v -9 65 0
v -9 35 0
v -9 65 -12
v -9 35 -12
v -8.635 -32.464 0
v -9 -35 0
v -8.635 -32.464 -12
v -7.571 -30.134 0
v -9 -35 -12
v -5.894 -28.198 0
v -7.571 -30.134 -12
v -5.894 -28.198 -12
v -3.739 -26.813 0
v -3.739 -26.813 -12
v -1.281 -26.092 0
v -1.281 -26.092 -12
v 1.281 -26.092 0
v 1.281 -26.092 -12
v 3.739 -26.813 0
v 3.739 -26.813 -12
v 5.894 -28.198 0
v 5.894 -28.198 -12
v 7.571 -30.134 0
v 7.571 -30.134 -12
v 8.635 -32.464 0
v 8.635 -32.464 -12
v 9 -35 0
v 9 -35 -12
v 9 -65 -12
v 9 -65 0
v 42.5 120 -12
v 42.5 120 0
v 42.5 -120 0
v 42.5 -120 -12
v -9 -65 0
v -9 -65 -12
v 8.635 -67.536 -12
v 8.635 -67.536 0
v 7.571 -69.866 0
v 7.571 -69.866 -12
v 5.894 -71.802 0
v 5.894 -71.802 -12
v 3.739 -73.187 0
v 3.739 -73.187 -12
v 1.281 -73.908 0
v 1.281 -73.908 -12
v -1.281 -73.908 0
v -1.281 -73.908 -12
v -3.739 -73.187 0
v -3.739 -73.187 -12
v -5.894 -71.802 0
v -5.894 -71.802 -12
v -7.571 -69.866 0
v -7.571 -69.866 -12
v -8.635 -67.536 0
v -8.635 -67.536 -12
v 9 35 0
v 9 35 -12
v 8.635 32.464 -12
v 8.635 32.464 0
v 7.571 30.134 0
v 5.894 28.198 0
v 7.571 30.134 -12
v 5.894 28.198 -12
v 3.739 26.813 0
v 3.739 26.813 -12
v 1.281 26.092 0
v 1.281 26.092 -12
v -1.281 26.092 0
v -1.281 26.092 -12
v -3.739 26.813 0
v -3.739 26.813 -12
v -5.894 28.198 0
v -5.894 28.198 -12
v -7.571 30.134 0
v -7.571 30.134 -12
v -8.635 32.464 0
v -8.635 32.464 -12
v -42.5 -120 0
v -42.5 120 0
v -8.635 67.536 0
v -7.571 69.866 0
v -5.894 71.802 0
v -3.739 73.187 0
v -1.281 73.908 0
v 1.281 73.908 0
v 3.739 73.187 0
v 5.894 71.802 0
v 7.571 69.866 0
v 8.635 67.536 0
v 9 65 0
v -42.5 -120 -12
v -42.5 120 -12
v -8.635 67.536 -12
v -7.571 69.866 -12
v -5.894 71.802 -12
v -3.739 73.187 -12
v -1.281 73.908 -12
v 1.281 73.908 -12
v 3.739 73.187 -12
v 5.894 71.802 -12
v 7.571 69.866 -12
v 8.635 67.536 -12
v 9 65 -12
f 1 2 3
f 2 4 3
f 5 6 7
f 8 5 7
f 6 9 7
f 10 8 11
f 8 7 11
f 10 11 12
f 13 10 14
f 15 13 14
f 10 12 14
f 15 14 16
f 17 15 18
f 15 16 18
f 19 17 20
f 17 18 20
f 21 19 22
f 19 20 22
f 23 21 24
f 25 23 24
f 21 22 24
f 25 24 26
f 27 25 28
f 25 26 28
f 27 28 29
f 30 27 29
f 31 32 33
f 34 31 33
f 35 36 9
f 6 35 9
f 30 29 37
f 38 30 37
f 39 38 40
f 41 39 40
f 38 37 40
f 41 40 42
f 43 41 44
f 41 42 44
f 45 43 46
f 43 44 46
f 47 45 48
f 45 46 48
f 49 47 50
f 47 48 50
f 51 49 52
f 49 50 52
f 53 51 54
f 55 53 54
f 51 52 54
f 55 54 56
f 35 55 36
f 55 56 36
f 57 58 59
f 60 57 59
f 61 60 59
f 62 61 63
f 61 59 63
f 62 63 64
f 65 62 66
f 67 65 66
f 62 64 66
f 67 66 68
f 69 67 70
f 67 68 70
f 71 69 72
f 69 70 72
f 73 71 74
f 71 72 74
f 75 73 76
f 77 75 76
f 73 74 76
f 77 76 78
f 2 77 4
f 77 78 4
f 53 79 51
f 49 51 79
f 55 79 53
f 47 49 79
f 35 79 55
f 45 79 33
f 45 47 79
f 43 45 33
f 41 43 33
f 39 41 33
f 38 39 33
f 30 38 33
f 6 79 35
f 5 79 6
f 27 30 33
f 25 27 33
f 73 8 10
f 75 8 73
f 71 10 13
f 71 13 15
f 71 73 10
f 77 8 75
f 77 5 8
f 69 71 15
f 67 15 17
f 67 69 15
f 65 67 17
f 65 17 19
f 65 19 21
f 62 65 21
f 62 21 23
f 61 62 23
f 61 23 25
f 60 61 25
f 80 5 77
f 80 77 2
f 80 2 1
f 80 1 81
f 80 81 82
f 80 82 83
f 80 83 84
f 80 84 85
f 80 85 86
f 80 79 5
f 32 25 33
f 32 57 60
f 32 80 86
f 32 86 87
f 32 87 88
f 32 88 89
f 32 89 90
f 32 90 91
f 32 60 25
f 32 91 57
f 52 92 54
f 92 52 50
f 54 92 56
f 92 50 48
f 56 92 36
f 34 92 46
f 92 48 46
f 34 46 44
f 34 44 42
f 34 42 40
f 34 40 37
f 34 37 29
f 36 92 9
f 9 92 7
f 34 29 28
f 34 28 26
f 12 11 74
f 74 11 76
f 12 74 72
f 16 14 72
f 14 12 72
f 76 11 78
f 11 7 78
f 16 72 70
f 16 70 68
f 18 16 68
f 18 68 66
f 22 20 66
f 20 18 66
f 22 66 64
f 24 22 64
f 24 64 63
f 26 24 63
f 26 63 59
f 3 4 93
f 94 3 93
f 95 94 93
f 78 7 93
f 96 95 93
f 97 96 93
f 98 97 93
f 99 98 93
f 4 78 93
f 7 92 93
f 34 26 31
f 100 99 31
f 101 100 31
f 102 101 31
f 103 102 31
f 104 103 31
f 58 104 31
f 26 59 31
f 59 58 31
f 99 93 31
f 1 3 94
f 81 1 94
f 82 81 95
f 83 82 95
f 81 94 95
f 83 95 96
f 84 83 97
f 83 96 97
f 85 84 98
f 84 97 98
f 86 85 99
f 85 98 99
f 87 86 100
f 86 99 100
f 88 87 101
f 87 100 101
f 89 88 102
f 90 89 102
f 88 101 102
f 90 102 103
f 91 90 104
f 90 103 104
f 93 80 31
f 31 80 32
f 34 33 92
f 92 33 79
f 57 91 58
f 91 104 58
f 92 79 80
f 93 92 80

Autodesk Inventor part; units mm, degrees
ref_plane "YZ Plane" through (0, 0, 0) normal (1, 0, 0) x (0, 1, 0)
ref_plane "XZ Plane" through (0, 0, 0) normal (0, 1, 0) x (-1, 0, 0)
ref_plane "XY Plane" through (0, 0, 0) normal (0, 0, 1) x (1, 0, 0)
sketch "Sketch1" plane through (0, 0, 0) normal (0, 0, 1) x (1, 0, 0)
  line L0 (42.5, -120) -> (-42.5, -120)
  line L1 (-42.5, -120) -> (-42.5, 120)
  line L2 (-42.5, 120) -> (42.5, 120)
  line L3 (42.5, 120) -> (42.5, -120)
  line L4 (42.5, -120) -> (-42.5, 120) construction
  line L5 (-42.5, -120) -> (42.5, 120) construction
  point P0 (0, 0)
  dimension "d42" = 85
  dimension "d43" = 240
extrude "Extrusion1" add sketch "Sketch1" against normal blind 12
sketch "Sketch2" plane through (0, 0, -12) normal (0, 0, -1) x (1, 0, 0)
  line L0 (42.5, -120) -> (42.5, 120) projected
  line L1 (0, -50) -> (0, 50)
  line L2 (0, -65) -> (0, -35) construction
  line L3 (9, -65) -> (9, -35)
  line L4 (-9, -35) -> (-9, -65)
  arc A0 (-9, -65) -> (9, -65) centre (0, -65) ccw
  arc A1 (9, -35) -> (-9, -35) centre (0, -35) ccw
  line L5 (0, 35) -> (0, 65) construction
  line L6 (9, 35) -> (9, 65)
  line L7 (-9, 65) -> (-9, 35)
  arc A2 (-9, 35) -> (9, 35) centre (0, 35) ccw
  arc A3 (9, 65) -> (-9, 65) centre (0, 65) ccw
  point P0 (0, 0)
  point P1 (0, -50)
  point P2 (0, 0)
  dimension "d46" = 100
  dimension "d47" = 30
  dimension "d48" = 18
  dimension "d49" = 30
  dimension "d50" = 18
extrude "Extrusion2" cut sketch "Sketch2" against normal through all
equation "\"d49\" = d47"
equation "\"d50\" = d48"
properties part number "StairsConnectionPlate" material "Steel"
